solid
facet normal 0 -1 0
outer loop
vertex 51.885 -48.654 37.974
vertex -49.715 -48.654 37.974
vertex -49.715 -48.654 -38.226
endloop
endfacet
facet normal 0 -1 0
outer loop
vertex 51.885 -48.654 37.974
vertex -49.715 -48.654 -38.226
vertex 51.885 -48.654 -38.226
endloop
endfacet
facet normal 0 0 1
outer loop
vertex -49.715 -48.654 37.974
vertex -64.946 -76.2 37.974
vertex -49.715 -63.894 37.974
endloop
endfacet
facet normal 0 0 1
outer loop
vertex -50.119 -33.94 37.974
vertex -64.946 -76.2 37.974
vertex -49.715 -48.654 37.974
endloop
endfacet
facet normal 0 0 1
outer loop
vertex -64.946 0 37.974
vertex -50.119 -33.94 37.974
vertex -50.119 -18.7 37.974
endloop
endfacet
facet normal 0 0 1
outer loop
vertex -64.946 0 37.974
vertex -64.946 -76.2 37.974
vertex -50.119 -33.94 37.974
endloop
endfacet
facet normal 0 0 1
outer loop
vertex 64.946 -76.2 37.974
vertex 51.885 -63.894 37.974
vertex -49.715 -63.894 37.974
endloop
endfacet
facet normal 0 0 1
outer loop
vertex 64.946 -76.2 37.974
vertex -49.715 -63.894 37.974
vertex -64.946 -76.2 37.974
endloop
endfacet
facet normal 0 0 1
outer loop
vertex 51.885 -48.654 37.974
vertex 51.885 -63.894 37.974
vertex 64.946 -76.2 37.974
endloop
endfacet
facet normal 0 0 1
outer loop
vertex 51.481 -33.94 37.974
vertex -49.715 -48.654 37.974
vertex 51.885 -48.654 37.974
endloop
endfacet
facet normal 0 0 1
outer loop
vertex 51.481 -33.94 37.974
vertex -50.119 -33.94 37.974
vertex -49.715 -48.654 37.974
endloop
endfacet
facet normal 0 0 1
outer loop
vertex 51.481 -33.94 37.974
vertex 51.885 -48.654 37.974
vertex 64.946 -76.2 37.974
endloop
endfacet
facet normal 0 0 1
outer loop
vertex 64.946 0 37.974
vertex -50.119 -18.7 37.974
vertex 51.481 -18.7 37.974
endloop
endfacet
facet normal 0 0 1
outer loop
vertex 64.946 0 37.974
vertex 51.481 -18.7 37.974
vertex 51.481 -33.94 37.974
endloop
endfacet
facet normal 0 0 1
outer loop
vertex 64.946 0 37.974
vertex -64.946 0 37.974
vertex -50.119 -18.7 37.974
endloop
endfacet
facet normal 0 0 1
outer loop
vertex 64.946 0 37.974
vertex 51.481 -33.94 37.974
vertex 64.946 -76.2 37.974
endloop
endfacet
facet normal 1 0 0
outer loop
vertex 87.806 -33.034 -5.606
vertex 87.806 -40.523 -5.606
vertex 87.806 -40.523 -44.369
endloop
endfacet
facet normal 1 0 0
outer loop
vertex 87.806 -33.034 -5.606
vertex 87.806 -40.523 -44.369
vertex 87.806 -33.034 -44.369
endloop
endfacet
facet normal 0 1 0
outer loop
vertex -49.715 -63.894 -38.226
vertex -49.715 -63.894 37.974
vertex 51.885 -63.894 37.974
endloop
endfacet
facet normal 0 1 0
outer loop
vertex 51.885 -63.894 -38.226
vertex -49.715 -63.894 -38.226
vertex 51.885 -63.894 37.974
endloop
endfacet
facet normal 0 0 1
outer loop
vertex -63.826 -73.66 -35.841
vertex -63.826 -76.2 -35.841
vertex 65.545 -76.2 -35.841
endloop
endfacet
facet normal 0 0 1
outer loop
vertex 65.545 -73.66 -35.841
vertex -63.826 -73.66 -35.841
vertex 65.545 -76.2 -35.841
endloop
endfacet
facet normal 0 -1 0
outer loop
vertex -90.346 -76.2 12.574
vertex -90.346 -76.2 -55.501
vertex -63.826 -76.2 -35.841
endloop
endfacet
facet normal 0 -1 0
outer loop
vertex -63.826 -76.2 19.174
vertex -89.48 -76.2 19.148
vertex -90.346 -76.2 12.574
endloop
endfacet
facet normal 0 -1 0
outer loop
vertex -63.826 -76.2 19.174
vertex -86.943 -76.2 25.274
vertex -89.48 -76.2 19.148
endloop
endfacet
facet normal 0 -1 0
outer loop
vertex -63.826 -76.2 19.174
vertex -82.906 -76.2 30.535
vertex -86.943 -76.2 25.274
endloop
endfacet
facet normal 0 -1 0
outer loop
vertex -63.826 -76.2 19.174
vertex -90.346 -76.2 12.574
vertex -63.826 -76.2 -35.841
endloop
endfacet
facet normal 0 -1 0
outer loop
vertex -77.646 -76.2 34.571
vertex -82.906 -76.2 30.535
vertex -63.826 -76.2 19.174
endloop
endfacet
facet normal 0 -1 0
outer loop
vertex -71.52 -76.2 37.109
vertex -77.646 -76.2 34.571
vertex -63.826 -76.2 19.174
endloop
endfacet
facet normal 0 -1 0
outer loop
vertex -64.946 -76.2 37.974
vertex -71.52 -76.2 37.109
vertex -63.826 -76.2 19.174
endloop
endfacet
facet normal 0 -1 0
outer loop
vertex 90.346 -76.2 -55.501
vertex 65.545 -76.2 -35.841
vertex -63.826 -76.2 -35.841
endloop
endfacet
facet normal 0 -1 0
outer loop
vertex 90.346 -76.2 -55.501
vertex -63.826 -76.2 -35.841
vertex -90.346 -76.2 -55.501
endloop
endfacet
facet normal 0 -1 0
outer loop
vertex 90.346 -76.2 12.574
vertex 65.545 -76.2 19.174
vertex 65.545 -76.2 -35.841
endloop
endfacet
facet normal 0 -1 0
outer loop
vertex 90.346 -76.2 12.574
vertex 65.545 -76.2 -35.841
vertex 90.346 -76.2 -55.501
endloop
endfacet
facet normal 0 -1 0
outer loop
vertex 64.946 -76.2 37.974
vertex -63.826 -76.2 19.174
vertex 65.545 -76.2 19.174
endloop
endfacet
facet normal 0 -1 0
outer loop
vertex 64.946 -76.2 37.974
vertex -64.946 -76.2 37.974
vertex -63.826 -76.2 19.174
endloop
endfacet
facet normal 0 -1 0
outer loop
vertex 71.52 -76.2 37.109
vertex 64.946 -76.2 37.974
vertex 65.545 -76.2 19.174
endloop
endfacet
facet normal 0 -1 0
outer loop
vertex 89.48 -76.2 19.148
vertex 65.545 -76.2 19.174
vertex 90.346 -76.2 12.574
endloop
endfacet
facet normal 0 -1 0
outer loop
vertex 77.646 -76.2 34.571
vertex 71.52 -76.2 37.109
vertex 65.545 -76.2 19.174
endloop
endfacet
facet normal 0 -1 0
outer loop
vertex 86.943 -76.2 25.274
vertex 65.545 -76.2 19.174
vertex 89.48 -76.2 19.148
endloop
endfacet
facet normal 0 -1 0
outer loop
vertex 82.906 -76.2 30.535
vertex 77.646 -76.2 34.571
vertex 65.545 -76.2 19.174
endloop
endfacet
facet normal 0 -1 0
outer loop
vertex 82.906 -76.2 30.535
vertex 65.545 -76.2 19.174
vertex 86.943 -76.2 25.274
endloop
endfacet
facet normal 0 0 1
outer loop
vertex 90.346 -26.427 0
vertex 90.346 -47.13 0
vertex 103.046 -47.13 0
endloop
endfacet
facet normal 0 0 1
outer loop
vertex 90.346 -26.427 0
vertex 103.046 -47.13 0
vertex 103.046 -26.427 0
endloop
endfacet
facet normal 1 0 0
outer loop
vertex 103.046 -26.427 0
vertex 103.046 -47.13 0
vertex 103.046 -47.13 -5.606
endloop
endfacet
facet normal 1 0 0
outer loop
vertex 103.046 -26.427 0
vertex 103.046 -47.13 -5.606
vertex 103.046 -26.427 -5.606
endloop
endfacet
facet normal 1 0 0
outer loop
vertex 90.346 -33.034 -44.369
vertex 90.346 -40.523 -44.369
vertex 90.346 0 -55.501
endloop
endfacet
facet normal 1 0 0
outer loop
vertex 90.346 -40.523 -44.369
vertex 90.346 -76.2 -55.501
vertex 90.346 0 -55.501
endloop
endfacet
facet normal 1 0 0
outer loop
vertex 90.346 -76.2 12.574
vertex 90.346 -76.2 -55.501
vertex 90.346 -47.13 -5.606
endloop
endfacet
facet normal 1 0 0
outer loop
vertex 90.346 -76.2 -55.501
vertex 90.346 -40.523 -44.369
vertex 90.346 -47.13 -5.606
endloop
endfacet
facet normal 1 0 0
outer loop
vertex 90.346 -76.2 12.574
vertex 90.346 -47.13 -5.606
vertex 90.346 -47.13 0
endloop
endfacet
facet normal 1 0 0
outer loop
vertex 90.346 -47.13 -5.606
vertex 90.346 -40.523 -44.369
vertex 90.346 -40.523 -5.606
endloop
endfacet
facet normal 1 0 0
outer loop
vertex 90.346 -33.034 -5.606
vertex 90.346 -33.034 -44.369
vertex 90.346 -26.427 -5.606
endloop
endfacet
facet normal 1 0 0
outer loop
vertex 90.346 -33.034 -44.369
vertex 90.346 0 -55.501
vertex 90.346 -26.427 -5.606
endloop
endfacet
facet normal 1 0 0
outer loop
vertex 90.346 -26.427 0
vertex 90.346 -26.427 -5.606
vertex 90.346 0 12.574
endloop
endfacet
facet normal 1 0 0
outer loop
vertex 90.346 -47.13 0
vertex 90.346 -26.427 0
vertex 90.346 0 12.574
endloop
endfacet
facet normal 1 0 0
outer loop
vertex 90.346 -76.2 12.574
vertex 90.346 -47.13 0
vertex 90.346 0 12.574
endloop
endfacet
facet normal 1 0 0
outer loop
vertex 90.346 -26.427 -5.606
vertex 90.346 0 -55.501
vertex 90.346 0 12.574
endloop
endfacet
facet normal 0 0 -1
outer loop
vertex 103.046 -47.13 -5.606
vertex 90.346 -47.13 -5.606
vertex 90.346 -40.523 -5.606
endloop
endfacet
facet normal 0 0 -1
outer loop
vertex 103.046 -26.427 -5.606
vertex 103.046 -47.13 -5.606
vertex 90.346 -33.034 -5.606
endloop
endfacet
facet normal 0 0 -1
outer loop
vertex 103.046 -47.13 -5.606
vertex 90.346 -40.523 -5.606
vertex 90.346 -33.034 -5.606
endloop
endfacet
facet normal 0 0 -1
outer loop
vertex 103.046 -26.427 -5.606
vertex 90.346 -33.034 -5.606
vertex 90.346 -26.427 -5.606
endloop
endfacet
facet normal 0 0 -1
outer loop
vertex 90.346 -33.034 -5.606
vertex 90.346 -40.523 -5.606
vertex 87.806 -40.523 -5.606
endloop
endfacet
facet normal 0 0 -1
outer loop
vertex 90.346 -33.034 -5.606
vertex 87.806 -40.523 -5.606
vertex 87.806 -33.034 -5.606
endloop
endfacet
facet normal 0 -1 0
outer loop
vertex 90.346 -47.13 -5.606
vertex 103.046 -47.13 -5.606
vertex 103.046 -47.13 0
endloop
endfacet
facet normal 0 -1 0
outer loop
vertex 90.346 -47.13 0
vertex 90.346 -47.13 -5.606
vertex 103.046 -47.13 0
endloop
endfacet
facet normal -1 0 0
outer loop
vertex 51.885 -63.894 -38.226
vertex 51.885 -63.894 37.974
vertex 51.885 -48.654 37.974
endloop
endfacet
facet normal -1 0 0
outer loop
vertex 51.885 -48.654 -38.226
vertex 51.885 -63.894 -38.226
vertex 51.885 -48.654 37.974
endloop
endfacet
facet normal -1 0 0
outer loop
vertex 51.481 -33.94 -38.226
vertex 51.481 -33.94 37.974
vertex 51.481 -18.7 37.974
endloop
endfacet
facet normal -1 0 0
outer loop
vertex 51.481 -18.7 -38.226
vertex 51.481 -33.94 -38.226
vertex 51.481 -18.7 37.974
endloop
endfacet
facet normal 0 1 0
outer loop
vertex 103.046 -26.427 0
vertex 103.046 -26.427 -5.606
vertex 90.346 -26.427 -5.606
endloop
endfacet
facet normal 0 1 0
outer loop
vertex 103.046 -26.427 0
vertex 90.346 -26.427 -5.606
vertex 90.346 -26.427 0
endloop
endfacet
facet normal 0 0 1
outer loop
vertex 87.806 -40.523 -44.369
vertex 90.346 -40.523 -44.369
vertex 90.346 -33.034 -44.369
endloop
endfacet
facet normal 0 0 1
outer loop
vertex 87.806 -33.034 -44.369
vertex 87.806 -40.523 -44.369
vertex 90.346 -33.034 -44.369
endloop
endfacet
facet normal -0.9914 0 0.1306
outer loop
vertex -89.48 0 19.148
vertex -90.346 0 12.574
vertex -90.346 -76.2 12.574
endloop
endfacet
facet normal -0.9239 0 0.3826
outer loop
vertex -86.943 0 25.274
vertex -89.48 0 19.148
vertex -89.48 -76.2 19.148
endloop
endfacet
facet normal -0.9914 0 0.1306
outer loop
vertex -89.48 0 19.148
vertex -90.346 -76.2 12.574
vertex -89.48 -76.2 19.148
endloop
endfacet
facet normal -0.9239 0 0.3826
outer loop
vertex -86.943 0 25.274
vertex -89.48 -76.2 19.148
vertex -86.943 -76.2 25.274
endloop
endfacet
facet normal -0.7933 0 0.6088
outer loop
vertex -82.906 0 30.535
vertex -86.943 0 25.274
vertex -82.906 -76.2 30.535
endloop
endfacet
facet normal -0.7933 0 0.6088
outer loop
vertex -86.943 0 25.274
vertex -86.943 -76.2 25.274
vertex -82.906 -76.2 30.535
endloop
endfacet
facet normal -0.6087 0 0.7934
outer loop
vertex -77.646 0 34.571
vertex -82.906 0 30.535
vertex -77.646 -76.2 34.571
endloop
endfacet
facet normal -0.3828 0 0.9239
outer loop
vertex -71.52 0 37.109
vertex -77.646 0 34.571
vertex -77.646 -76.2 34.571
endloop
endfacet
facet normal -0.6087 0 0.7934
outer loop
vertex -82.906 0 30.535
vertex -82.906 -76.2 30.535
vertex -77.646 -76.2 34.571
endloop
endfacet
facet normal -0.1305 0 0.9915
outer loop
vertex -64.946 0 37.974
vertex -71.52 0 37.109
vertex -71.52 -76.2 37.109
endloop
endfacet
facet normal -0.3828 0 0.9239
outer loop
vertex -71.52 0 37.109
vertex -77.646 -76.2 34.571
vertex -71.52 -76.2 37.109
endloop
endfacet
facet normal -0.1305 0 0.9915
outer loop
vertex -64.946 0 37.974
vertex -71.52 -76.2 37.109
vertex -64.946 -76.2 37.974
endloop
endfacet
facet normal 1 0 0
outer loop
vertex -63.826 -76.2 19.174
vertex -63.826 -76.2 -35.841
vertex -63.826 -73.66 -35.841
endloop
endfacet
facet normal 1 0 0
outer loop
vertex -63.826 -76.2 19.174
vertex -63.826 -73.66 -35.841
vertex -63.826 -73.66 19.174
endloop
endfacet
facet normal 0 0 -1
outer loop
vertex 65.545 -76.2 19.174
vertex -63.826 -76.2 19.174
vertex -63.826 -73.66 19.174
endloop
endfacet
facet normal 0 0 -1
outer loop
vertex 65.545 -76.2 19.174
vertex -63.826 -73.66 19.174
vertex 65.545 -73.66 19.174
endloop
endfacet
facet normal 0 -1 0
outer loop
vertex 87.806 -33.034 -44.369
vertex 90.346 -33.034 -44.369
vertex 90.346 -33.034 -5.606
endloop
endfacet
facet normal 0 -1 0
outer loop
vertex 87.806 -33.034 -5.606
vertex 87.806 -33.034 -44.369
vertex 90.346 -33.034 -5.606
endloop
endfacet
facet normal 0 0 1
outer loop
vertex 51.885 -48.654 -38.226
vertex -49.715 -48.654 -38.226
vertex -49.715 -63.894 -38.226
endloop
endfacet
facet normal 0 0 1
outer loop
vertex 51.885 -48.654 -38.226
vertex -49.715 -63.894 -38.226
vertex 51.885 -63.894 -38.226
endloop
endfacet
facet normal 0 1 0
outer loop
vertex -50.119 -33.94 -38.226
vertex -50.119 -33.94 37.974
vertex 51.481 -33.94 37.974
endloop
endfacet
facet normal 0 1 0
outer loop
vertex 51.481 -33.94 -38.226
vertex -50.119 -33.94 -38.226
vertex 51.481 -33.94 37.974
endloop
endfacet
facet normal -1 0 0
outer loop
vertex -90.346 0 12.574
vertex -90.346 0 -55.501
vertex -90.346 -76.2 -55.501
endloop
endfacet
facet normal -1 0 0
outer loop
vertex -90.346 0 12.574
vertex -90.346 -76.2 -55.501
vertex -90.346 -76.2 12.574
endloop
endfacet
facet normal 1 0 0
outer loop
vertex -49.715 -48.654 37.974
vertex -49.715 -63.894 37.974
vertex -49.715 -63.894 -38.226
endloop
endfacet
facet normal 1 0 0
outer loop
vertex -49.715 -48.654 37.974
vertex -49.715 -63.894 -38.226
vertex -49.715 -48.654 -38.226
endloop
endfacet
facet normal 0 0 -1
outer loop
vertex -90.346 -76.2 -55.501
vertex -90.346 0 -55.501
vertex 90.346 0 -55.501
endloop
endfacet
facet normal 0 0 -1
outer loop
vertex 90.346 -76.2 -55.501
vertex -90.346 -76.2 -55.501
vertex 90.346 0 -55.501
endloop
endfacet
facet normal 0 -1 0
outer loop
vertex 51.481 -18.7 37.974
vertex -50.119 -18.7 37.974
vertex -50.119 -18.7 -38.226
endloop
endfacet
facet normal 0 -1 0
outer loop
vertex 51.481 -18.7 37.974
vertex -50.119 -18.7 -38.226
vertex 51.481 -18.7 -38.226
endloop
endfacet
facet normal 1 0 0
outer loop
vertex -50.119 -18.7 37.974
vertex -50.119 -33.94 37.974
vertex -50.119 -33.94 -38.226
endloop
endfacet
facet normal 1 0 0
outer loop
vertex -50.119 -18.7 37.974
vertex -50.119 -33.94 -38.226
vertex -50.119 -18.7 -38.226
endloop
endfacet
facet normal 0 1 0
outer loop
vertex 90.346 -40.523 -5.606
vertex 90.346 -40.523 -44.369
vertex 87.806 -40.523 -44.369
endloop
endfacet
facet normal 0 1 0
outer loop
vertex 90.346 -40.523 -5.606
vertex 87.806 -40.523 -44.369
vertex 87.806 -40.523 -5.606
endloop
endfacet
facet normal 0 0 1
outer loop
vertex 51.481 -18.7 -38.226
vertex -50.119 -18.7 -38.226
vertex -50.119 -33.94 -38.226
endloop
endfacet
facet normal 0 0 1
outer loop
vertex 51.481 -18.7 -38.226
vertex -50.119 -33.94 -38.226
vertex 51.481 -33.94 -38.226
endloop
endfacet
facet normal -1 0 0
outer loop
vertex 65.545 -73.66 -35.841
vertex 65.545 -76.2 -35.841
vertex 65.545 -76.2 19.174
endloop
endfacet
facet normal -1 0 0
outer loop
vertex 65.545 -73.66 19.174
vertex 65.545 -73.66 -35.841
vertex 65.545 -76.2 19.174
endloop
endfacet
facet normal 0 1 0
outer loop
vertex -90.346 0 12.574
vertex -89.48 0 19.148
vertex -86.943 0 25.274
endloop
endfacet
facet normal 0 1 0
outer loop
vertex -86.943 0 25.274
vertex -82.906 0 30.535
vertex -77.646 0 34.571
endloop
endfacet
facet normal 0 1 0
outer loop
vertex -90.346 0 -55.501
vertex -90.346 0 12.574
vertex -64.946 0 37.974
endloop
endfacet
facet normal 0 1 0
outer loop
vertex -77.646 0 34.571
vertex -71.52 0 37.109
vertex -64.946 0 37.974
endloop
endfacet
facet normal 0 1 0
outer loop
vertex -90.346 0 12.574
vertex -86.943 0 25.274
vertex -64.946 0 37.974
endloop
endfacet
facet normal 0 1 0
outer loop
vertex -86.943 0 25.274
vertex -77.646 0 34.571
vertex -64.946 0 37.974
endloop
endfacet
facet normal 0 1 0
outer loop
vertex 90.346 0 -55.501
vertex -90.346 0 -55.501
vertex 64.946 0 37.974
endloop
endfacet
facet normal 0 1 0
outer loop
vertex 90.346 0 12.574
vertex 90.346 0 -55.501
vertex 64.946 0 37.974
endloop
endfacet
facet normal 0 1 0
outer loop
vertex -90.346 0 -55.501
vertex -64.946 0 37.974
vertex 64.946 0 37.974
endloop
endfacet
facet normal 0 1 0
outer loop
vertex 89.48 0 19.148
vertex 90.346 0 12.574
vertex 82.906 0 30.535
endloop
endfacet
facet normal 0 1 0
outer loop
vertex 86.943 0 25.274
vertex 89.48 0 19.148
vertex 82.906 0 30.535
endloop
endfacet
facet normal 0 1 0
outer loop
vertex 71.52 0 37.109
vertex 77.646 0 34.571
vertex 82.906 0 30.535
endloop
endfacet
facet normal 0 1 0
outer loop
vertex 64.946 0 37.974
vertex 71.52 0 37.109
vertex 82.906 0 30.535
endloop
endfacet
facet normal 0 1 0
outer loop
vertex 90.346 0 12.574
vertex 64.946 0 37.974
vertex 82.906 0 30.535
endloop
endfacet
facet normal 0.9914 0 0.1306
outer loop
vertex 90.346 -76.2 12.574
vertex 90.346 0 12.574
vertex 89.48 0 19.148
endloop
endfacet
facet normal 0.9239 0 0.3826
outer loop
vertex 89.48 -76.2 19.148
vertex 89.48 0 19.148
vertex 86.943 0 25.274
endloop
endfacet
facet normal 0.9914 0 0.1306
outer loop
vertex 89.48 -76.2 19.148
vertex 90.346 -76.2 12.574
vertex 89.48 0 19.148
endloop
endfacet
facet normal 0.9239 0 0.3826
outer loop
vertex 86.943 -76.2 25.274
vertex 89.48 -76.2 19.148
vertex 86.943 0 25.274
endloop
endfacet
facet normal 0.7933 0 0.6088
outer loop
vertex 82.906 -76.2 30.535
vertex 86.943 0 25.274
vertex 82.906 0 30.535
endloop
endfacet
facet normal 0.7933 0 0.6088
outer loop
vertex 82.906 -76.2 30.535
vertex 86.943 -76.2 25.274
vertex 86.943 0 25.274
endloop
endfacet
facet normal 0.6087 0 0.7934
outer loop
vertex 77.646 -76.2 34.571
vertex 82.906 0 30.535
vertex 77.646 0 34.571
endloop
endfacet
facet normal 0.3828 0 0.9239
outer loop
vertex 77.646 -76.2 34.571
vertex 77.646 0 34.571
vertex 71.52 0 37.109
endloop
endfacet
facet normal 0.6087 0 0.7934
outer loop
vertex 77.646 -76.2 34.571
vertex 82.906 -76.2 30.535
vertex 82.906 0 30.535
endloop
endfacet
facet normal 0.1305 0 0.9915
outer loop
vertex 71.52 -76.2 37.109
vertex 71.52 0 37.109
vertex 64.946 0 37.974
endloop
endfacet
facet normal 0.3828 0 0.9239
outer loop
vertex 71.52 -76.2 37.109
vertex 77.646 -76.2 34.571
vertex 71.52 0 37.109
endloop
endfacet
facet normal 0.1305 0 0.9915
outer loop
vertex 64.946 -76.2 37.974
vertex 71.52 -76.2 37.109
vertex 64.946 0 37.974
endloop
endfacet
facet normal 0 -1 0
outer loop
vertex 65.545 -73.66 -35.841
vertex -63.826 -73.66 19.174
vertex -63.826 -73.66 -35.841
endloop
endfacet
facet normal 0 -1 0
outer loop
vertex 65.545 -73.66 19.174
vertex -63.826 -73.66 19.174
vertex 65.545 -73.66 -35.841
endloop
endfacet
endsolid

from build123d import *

# Parameters (mm, degrees)
F0_W      = 180.69154
F0_H      = 93.475536
F1_DEPTH  = 76.2
F2_R      = 25.4
F3_W      = 101.6
F3_H      = 15.24
F4_DEPTH  = 76.2
F5_W      = 129.371017
F5_H      = 55.014919
F6_DEPTH  = 2.54
F7_W      = 20.702834
F7_H      = 5.605837
F8_DEPTH  = 12.7
F9_W      = 7.488246
F9_H      = 38.76276
F10_DEPTH = 2.54


with BuildPart() as f1:
    # F0 (on Front) → F1 (new body)
    with BuildSketch(Plane.XZ):
        with Locations((0, -8.763328)):
            Rectangle(F0_W, F0_H)
    extrude(amount=F1_DEPTH)

    # F2
    f2_edges = [f1.edges().sort_by_distance(p)[0] for p in [
        (90.34577, -38.1, 37.97444),
        (-90.34577, -38.1, 37.97444),
    ]]
    fillet(f2_edges, radius=F2_R)

    # F3 (on face) → F4 (cut)
    with BuildSketch(Plane.XY.offset(37.97444)):
        with Locations((1.085338, -56.274154)):
            Rectangle(F3_W, F3_H)
        with Locations((0.680554, -26.320373)):
            Rectangle(F3_W, F3_H)
    extrude(amount=-F4_DEPTH, mode=Mode.SUBTRACT)

    # F5 (on face) → F6 (cut)
    with BuildSketch(Plane.XZ.offset(76.2)):
        with Locations((0.859611, -8.333524)):
            Rectangle(F5_W, F5_H)
    extrude(amount=-F6_DEPTH, mode=Mode.SUBTRACT)

    # F7 (on face) → F8 (join)
    with BuildSketch(Plane.YZ.offset(90.34577)):
        with Locations((-36.778546, -2.802919)):
            Rectangle(F7_W, F7_H)
    extrude(amount=F8_DEPTH)

    # F9 (on face) → F10 (cut)
    with BuildSketch(Plane.YZ.offset(90.34577)):
        with Locations((-36.778546, -24.987215)):
            Rectangle(F9_W, F9_H)
    extrude(amount=-F10_DEPTH, mode=Mode.SUBTRACT)


solid = f1.part
